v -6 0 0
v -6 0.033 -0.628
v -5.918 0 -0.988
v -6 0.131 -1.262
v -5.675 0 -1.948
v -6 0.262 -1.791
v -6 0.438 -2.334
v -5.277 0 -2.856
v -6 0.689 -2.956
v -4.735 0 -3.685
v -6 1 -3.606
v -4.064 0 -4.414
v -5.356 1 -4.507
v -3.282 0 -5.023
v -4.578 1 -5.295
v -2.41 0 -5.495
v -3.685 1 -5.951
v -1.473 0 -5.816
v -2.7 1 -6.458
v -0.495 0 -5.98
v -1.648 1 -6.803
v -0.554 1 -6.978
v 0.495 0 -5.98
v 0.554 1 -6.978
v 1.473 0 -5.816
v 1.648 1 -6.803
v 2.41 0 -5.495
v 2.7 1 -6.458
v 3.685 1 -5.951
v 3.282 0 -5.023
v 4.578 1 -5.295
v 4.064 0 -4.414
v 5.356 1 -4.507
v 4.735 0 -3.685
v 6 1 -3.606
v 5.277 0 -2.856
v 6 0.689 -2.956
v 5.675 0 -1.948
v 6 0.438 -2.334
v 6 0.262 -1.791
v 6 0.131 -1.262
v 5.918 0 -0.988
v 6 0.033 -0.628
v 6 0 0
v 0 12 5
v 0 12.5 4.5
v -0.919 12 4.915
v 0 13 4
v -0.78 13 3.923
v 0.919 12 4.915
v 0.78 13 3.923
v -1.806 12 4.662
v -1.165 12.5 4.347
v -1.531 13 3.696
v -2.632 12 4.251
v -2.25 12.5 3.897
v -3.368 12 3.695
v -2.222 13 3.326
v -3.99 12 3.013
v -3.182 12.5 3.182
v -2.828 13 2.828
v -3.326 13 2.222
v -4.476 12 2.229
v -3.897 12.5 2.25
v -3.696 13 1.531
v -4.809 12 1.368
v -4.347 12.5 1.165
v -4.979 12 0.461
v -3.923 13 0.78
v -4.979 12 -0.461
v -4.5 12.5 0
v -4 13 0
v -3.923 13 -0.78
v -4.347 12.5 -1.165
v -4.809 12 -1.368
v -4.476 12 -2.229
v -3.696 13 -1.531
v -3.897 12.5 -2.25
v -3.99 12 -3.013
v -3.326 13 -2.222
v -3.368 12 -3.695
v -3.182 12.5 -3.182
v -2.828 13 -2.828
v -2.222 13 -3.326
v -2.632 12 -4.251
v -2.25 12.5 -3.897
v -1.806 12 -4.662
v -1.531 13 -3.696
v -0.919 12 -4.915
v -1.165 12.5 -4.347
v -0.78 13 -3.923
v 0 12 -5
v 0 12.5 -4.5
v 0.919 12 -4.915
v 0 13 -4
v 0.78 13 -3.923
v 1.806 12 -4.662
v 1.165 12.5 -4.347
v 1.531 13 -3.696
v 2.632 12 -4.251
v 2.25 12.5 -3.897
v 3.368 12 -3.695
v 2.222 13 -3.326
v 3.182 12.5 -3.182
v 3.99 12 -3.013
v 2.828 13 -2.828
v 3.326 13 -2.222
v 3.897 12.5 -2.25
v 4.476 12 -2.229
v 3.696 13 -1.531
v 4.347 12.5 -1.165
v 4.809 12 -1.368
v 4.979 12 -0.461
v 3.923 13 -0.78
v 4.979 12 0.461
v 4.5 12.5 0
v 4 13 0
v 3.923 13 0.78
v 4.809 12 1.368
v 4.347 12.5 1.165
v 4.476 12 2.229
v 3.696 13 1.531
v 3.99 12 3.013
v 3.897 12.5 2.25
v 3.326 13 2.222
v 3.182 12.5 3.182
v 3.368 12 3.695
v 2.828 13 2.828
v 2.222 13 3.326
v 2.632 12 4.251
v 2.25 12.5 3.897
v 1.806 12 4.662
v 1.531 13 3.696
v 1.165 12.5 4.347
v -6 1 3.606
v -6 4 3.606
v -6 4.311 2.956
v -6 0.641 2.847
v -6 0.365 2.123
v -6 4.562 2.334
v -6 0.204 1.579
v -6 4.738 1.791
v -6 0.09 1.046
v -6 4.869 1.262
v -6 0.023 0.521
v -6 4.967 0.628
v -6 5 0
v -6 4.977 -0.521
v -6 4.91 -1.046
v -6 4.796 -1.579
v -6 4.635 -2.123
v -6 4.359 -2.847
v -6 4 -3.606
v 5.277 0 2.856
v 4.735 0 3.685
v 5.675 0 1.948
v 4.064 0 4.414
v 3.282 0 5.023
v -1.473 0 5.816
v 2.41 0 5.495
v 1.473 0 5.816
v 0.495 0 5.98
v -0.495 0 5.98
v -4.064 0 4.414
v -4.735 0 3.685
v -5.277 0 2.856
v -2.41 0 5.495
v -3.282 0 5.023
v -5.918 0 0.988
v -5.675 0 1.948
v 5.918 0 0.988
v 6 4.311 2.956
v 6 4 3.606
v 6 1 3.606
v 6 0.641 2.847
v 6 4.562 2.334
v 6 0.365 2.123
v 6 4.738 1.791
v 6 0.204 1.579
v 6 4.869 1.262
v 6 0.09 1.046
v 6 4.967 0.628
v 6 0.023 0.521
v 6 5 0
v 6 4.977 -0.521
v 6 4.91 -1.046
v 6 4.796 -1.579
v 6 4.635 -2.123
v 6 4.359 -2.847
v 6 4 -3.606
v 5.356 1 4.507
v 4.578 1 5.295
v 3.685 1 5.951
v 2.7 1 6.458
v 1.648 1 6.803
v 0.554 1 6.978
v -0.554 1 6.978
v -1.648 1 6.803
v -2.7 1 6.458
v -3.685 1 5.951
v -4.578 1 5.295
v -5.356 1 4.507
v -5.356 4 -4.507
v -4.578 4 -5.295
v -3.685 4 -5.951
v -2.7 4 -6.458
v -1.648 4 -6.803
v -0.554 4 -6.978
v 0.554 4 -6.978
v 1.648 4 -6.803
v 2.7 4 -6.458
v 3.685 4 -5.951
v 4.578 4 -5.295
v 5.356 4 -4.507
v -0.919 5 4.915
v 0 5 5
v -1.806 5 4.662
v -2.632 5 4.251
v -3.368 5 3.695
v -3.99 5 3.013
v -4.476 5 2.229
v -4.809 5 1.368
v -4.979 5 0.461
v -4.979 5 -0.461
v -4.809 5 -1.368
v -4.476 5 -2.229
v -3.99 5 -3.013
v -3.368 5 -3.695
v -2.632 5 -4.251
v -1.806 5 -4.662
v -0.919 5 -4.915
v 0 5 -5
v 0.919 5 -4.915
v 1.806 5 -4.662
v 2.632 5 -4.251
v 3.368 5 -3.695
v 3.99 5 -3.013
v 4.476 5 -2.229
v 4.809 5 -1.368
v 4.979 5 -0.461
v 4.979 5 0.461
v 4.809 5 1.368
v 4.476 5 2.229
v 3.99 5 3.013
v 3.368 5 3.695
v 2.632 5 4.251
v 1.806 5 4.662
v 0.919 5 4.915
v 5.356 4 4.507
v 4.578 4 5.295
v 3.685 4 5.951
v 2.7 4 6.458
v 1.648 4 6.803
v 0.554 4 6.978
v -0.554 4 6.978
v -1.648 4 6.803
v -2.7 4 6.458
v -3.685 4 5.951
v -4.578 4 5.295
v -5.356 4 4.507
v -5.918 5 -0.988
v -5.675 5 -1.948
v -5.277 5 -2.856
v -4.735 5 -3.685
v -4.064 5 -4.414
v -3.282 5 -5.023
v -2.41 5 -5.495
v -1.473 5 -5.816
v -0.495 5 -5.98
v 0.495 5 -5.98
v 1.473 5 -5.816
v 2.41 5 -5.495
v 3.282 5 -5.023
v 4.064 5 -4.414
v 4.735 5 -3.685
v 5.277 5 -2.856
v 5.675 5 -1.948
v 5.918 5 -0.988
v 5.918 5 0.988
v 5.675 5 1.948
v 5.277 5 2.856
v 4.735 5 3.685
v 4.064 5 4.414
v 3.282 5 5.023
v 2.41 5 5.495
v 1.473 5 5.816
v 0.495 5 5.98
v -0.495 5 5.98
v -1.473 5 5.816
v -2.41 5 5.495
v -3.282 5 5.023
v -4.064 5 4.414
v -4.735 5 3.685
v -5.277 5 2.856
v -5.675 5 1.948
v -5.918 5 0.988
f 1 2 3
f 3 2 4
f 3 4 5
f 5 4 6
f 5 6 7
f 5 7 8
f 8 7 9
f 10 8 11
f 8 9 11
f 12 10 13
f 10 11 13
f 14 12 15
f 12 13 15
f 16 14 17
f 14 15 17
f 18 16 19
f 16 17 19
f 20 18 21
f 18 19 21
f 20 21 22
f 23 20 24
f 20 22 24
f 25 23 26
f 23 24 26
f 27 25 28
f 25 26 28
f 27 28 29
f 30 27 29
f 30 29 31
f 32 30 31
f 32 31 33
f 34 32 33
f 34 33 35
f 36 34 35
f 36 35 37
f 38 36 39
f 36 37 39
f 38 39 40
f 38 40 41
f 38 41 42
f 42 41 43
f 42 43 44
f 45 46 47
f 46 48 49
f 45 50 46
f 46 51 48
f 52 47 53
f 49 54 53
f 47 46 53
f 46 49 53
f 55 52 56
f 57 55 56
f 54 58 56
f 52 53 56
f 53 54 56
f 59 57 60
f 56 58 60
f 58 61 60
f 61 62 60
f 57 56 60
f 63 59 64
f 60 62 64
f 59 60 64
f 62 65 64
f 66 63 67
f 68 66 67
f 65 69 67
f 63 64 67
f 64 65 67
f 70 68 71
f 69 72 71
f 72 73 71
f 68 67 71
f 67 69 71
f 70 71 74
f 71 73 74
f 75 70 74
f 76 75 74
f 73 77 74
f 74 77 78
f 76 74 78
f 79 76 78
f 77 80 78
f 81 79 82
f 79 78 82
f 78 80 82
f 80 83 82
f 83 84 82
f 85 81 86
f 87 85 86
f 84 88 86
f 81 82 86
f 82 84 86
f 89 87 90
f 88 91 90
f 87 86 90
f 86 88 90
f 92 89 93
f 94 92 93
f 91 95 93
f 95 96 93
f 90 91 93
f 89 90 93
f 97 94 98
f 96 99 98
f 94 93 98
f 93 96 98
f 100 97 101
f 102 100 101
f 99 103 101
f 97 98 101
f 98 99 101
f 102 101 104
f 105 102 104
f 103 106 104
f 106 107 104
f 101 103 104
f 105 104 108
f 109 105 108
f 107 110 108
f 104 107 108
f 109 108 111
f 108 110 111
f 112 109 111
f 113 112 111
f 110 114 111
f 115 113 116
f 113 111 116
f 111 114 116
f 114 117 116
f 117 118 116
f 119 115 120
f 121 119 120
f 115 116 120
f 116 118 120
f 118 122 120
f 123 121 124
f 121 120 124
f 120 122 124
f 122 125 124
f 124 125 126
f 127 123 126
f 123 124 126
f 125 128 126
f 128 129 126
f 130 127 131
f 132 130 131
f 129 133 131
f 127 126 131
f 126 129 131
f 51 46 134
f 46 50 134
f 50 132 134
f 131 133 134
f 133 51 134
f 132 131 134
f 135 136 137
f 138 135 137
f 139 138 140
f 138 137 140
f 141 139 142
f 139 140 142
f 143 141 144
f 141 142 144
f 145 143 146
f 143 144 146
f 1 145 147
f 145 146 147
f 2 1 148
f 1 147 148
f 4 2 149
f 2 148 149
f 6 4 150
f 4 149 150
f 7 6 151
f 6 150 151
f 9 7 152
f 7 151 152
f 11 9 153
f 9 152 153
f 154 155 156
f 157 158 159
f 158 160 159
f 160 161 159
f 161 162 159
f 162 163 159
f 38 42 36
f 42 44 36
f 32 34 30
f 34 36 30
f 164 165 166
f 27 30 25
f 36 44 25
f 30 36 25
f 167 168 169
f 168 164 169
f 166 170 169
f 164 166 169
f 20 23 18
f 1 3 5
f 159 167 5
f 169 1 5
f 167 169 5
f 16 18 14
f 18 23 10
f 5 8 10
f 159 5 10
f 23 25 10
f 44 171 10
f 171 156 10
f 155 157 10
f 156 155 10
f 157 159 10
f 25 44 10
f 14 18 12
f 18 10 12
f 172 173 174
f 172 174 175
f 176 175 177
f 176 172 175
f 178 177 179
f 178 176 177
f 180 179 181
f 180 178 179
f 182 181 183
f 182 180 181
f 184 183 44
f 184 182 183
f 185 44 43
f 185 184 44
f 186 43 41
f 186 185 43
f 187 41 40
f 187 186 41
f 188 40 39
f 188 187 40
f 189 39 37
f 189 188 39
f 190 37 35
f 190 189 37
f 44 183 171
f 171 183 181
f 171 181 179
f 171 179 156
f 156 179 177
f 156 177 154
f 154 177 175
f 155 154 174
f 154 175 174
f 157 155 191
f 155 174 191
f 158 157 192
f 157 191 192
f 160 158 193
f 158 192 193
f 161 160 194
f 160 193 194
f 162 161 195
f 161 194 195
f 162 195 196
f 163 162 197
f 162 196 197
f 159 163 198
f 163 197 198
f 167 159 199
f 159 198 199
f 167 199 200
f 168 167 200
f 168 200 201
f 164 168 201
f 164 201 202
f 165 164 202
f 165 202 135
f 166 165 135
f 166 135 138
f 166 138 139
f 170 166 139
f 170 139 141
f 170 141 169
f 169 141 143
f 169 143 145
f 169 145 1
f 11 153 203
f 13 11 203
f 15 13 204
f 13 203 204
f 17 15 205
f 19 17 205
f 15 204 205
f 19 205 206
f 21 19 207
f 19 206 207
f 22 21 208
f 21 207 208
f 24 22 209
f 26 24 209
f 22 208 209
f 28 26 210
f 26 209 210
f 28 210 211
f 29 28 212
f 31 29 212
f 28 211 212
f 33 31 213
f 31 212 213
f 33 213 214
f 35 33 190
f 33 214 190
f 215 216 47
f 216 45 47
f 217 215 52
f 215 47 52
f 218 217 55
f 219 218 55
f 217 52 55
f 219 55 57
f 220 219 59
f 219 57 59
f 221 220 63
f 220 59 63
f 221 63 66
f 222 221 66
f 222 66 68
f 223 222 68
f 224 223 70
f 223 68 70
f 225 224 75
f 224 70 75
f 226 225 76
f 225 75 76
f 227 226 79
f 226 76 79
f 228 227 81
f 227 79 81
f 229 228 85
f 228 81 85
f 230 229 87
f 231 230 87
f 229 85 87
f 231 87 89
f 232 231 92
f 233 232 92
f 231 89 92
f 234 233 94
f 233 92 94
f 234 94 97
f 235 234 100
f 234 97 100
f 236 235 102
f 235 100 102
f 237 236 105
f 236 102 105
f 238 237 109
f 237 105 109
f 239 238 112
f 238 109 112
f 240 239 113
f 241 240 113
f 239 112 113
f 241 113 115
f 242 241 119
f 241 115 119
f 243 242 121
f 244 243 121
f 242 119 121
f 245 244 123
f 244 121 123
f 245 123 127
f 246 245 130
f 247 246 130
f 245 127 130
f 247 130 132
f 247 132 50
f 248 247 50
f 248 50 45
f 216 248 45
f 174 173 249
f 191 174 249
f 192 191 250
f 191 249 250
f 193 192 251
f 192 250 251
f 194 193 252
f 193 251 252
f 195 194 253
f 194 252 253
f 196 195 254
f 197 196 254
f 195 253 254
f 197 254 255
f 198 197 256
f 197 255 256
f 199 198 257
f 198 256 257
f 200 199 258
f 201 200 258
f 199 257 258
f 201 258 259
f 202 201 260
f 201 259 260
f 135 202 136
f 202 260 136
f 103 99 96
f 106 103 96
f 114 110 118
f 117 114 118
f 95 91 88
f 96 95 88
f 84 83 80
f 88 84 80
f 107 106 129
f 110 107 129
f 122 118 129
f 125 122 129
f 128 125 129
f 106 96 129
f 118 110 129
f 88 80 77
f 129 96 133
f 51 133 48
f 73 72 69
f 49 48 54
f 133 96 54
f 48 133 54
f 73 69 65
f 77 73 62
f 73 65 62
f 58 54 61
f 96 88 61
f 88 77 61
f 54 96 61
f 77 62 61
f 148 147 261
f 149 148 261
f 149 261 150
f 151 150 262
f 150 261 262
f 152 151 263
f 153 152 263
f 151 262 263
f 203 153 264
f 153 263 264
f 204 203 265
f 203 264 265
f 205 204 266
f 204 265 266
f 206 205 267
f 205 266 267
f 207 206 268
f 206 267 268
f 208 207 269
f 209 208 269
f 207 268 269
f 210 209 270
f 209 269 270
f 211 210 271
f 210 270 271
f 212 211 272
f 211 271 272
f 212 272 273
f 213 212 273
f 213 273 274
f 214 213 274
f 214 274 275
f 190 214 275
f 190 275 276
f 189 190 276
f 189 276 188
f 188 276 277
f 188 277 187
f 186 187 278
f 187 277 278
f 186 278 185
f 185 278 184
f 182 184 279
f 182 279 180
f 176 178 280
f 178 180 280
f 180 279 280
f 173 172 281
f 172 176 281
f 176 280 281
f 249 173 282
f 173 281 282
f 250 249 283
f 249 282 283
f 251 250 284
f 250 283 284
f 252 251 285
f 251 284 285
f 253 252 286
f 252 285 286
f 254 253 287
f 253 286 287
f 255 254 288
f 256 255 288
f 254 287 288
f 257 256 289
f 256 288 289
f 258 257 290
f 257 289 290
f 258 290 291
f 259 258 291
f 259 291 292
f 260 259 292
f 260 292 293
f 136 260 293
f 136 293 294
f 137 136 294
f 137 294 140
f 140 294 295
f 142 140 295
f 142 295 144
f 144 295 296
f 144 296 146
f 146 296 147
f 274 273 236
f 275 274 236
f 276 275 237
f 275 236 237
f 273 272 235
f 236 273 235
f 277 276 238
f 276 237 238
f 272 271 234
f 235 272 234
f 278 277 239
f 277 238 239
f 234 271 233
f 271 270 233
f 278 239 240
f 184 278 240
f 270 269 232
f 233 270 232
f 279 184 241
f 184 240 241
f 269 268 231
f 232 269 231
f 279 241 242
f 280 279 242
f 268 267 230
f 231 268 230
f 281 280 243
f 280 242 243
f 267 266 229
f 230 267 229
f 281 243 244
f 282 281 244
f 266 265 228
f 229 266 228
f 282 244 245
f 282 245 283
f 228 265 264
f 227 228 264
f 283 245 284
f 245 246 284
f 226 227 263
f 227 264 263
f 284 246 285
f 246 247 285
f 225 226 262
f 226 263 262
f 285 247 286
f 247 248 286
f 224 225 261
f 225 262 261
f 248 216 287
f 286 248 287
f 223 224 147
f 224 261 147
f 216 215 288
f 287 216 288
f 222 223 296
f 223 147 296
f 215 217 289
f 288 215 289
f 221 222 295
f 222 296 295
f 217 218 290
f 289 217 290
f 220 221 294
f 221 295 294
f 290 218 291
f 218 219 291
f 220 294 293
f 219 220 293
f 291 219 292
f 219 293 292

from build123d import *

# Parameters (mm, degrees)
SKIZZE3_W                       = 5
SKIZZE3_H                       = 23
SCHNITT_LINEAR_AUSTRAGEN1_DEPTH = 9


with BuildPart() as part:
    # Skizze2 → Rotation1 (revolve)
    with BuildSketch(Plane(origin=(0, 0, 0), x_dir=(0, 0, -1), z_dir=(1, 0, 0)), mode=Mode.PRIVATE) as rotation1_sk:
        Polygon((0, 0), (6, 0), (7, 1), (7, 4), (6, 5), (5, 5), (5, 12), (4, 13), (0, 13), align=None)
    revolve(rotation1_sk.sketch.rotate(Axis((0, 0, 0), (0, -1, 0)), 180), axis=Axis((0, 0, 0), (0, -1, 0)))

    # Skizze3 → Schnitt-Linear austragen1 (cut)
    with BuildSketch(Plane(origin=(0, 5, 0), x_dir=(1, 0, 0), z_dir=(0, 1, 0))):
        with Locations((8.5, 0)):
            Rectangle(SKIZZE3_W, SKIZZE3_H)
        with Locations((-8.5, 0)):
            Rectangle(SKIZZE3_W, SKIZZE3_H)
    extrude(amount=-SCHNITT_LINEAR_AUSTRAGEN1_DEPTH, mode=Mode.SUBTRACT)


solid = part.part
